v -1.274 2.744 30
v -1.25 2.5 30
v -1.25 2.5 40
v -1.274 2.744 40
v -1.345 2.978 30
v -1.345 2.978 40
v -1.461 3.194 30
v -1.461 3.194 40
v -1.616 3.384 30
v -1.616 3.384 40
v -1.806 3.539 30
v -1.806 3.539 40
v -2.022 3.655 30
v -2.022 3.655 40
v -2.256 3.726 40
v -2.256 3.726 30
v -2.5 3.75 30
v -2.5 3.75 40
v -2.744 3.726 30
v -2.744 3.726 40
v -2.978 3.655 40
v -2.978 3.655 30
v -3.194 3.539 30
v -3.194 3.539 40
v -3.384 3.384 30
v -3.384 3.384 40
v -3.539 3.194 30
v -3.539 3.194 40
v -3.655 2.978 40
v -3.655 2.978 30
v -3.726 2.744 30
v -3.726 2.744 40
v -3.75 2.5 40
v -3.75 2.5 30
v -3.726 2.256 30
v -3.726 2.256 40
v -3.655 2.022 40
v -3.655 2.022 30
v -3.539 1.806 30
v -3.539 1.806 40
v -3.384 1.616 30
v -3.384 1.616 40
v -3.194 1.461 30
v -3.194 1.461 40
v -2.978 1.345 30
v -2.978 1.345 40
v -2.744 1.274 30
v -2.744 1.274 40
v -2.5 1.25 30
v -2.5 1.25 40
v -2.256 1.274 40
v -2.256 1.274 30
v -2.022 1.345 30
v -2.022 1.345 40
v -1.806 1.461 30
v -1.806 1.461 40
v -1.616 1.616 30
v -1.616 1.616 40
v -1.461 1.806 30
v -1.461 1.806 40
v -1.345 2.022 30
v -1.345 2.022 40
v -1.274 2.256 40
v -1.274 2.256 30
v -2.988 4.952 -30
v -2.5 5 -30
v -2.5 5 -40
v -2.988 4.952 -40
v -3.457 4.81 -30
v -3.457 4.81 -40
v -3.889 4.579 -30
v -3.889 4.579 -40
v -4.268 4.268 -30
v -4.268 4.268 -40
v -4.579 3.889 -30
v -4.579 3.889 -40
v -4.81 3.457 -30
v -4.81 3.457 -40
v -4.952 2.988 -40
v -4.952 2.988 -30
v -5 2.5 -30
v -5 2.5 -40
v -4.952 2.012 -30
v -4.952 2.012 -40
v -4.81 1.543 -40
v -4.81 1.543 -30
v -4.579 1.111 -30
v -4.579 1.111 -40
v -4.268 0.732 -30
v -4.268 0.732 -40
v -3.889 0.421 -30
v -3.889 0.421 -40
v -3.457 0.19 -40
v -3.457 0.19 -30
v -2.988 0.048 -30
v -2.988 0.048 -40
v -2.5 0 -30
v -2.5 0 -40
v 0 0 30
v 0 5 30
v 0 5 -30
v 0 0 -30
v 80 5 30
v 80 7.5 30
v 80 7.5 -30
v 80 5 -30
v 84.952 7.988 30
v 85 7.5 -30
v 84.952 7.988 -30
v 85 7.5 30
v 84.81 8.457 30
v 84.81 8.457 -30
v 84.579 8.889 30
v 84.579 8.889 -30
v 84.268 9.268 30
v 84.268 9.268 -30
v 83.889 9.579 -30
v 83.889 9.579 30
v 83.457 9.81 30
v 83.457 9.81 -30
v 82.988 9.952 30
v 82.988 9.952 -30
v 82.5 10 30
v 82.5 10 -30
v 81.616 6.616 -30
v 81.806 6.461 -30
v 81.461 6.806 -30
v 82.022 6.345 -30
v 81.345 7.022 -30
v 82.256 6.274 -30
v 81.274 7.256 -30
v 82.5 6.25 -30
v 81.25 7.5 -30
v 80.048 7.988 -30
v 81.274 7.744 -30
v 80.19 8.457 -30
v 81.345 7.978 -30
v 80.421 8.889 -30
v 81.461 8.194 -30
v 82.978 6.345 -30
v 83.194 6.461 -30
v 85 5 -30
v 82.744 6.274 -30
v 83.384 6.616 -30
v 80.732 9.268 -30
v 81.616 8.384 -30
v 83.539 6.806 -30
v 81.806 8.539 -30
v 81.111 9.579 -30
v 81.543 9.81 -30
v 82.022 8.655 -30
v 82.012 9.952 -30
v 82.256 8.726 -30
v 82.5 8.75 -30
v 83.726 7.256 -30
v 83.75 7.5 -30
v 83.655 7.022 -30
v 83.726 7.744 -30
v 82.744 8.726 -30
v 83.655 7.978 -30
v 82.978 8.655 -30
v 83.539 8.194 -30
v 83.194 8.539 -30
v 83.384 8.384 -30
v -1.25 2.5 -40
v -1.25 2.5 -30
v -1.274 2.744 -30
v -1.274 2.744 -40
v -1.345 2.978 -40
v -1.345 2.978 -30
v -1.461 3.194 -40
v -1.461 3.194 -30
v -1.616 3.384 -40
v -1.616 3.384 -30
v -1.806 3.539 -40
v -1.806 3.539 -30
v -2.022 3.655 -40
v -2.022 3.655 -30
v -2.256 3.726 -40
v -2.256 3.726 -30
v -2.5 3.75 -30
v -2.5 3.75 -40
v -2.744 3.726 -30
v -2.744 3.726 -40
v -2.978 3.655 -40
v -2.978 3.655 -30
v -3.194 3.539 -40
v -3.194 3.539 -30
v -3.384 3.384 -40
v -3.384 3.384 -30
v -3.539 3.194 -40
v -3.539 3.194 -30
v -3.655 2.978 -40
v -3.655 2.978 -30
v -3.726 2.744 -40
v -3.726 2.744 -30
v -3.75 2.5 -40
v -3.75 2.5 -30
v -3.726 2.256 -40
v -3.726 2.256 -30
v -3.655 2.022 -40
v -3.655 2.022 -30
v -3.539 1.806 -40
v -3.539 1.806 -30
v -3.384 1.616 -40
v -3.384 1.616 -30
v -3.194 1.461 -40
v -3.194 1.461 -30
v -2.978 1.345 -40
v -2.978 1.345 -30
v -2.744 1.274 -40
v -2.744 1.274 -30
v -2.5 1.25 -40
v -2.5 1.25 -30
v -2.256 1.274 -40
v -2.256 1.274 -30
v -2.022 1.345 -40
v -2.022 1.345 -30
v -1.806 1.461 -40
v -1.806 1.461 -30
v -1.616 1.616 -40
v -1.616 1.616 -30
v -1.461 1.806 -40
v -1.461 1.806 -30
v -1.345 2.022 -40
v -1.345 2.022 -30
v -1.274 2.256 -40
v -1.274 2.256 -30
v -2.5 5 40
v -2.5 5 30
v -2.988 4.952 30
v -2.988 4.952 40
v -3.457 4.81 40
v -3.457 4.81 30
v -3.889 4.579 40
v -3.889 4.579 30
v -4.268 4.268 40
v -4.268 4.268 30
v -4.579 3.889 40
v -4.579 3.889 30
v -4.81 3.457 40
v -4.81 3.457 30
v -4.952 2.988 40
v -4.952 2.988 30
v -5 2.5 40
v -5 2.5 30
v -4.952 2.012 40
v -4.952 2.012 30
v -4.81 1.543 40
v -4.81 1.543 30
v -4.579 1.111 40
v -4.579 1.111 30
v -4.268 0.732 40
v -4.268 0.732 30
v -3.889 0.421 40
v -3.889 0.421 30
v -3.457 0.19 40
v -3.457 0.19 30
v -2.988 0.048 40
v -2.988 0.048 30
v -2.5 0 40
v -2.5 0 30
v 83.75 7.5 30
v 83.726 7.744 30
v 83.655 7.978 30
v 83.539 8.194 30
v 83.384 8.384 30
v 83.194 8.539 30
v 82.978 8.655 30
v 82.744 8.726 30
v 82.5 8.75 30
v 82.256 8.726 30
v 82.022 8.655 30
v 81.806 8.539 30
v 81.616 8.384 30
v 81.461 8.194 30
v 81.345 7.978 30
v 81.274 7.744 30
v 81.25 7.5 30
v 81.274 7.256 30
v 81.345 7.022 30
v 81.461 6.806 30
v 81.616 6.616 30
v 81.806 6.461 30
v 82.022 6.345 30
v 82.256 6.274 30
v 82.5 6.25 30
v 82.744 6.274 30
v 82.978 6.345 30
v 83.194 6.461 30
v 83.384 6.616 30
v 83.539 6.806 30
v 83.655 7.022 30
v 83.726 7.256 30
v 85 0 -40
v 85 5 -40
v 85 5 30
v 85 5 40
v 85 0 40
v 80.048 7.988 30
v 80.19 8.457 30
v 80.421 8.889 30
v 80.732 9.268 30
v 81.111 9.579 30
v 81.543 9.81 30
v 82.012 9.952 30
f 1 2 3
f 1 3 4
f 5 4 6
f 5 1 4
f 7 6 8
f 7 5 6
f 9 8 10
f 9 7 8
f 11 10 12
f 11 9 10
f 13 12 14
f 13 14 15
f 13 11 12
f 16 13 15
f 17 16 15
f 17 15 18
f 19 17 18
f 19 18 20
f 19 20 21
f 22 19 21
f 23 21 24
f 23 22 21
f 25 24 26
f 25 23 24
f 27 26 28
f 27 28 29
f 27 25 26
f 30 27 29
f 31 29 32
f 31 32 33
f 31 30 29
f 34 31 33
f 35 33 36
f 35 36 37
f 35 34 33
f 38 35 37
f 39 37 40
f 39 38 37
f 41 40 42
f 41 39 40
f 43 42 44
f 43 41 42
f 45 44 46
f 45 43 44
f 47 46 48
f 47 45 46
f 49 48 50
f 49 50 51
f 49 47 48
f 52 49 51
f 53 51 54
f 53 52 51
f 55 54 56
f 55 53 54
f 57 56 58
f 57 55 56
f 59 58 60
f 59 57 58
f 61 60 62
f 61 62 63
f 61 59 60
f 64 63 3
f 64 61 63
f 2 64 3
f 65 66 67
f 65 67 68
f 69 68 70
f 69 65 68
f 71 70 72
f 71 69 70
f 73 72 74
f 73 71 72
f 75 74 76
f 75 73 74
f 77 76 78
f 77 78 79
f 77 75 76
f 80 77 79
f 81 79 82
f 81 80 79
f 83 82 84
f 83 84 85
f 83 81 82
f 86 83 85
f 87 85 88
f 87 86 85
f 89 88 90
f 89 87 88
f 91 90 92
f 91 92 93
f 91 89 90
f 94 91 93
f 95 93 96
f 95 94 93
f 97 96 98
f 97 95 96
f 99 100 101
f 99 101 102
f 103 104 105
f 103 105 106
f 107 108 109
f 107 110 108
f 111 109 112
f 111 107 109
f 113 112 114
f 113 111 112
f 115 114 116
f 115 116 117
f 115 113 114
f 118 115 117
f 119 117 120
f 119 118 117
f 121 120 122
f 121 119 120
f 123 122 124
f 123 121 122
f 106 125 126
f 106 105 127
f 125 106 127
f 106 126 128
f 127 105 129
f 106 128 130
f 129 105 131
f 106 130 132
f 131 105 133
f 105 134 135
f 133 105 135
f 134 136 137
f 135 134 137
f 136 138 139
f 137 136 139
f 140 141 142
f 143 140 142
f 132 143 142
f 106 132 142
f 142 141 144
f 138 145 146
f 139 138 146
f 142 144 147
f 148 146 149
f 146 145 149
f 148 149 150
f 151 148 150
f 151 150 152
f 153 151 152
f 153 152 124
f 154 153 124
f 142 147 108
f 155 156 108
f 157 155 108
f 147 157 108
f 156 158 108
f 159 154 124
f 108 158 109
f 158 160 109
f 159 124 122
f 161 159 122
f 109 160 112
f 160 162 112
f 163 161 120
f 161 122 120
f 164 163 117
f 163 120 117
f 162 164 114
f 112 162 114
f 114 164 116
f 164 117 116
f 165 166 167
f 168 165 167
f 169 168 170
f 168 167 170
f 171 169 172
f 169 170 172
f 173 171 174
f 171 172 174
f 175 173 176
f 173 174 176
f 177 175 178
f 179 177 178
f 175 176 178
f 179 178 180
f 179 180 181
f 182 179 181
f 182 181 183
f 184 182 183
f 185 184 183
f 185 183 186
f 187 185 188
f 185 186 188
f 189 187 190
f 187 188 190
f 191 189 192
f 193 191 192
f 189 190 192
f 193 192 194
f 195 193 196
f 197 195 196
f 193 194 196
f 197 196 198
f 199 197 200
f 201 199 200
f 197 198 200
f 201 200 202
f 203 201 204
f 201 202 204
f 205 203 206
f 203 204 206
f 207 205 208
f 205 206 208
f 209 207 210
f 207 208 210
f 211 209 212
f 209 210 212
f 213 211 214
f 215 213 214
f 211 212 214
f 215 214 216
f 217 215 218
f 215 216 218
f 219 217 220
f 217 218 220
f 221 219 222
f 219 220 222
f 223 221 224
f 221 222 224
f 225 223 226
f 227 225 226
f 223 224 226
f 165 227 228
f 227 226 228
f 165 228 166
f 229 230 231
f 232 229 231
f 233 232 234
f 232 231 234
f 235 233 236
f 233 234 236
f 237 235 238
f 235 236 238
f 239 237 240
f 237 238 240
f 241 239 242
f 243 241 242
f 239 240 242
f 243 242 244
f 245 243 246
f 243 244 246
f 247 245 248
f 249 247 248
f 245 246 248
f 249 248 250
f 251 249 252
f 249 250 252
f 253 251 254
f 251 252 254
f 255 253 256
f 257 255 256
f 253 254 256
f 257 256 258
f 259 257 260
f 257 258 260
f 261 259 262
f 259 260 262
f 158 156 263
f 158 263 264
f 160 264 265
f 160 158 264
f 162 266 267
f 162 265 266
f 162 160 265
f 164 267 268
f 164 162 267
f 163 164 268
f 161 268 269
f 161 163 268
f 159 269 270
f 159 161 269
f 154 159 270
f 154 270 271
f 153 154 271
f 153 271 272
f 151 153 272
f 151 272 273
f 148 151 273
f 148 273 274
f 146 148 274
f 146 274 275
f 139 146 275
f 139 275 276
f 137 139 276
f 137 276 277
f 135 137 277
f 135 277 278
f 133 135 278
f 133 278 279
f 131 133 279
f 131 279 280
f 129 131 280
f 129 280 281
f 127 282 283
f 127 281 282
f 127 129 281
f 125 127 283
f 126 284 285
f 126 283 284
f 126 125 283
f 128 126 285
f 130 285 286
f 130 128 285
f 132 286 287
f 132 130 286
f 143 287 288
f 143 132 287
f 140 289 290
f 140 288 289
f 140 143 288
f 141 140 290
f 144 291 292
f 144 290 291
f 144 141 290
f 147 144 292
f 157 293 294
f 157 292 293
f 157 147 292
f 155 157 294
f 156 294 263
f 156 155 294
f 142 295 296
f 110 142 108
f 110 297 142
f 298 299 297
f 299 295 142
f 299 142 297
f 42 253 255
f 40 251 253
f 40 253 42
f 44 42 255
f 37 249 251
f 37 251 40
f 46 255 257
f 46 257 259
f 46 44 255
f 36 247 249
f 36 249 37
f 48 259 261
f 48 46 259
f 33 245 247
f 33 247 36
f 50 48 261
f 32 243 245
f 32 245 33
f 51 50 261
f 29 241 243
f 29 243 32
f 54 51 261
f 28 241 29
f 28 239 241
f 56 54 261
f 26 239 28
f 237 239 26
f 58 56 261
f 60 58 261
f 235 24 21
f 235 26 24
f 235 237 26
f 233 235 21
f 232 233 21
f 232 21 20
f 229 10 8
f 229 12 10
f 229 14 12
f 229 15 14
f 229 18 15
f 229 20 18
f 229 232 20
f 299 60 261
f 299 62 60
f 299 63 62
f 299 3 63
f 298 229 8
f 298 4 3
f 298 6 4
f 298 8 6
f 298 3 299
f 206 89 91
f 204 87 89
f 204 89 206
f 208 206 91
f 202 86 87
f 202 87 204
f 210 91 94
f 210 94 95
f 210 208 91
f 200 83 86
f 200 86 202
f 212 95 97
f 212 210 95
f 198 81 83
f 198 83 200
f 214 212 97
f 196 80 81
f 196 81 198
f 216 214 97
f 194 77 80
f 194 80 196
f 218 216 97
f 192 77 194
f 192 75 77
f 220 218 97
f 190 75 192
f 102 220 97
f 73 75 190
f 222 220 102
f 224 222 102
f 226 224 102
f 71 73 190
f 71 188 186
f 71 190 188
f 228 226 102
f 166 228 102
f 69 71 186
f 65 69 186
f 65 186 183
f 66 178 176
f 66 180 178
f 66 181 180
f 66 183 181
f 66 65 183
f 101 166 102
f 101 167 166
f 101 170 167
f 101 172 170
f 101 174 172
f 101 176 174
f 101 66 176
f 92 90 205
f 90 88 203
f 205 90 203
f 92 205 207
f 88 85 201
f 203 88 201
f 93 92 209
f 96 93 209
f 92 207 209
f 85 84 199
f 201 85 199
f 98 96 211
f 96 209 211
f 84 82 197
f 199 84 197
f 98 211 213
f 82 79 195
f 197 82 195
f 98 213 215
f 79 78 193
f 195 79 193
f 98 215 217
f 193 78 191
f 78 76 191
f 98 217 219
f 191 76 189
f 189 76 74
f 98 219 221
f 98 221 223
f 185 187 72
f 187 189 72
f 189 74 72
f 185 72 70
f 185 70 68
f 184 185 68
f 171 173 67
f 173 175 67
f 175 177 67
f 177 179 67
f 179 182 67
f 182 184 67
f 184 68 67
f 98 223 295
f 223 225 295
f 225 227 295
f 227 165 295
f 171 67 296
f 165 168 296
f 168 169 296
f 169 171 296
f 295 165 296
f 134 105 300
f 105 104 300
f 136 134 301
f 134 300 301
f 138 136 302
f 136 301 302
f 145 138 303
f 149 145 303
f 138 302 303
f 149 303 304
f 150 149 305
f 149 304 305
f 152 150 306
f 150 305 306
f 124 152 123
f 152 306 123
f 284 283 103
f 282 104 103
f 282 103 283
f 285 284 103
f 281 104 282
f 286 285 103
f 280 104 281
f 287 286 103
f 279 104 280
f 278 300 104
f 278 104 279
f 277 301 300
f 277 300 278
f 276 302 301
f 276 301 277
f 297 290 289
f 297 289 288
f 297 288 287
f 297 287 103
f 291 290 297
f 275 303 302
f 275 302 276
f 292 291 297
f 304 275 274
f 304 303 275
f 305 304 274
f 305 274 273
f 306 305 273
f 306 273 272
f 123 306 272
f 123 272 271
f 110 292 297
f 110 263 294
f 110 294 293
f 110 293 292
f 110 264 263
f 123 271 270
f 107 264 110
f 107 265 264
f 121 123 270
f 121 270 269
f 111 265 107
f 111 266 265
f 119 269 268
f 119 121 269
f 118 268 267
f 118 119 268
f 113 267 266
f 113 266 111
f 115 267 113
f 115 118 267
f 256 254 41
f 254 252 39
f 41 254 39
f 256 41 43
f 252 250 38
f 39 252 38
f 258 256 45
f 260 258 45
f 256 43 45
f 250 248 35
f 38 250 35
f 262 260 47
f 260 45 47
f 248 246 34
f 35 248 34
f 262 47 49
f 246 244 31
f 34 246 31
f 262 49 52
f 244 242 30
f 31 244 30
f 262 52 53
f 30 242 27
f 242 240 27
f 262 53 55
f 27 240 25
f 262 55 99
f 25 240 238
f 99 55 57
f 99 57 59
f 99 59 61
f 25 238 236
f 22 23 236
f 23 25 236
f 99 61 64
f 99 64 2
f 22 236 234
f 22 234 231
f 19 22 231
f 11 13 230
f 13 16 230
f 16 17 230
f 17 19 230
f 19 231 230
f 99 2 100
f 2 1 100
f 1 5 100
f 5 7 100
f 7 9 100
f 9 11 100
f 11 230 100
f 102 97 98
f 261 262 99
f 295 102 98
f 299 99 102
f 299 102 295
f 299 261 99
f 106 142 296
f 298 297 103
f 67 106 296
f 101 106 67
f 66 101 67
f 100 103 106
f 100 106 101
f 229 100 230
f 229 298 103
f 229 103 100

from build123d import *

# Parameters (mm, degrees)
BOSS_EXTRUDE1_DEPTH     = 40
BOSS_EXTRUDE2_START     = 30
SKETCH2_R               = 1.25
BOSS_EXTRUDE2_DEPTH     = 10
CUT_EXTRUDE1_START      = -30
SKETCH3_W               = 5
SKETCH3_H               = 5
CUT_EXTRUDE1_DEPTH      = 10
CUT_EXTRUDE2_DEPTH      = 95.472218138
CUT_EXTRUDE2_DEPTH_BACK = 95.472218138
SKETCH4_R               = 1.25
FILLET1_R               = 2.5


with BuildPart() as part:
    # Sketch1 → Boss-Extrude1 (new, symmetric)
    with BuildSketch(Plane.XY):
        Polygon((0, 0), (85, 0), (85, 10), (80, 10), (80, 5), (0, 5), align=None)
    extrude(amount=BOSS_EXTRUDE1_DEPTH, both=True)

    # Sketch2 → Boss-Extrude2 (add)
    with BuildSketch(Plane.XY.offset(BOSS_EXTRUDE2_START)):
        with BuildLine():
            Line((0, 5), (-2.5, 5))
            ThreePointArc((-2.5, 5), (-5, 2.5), (-2.5, 0))
            Line((-2.5, 0), (0, 0))
            Line((0, 0), (0, 5))
        make_face()
        with Locations((-2.5, 2.5)):
            Circle(SKETCH2_R, mode=Mode.SUBTRACT)
    boss_extrude2 = extrude(amount=BOSS_EXTRUDE2_DEPTH)

    # Mirror2: Boss-Extrude2 across plane
    add(boss_extrude2.mirror(Plane.XY))

    # Sketch3 → Cut-Extrude1 (cut)
    with BuildSketch(Plane.XY.offset(CUT_EXTRUDE1_START)):
        with Locations((82.5, 7.5)):
            Rectangle(SKETCH3_W, SKETCH3_H)
    cut_extrude1 = extrude(amount=-CUT_EXTRUDE1_DEPTH, mode=Mode.SUBTRACT)

    # Mirror3: Cut-Extrude1 across plane
    add(cut_extrude1.mirror(Plane.XY), mode=Mode.SUBTRACT)

    # Sketch4 → Cut-Extrude2 (cut, two sides: drawn at the far end of the back side and taken through both)
    with BuildSketch(Plane.XY.offset(-CUT_EXTRUDE2_DEPTH_BACK)):
        with Locations((82.5, 7.5)):
            Circle(SKETCH4_R)
    extrude(amount=CUT_EXTRUDE2_DEPTH + CUT_EXTRUDE2_DEPTH_BACK, mode=Mode.SUBTRACT)

    # Fillet1
    fillet1_edges = [part.edges().sort_by_distance(p)[0] for p in [
        (80, 10, 0),
        (85, 10, 0),
    ]]
    fillet(fillet1_edges, radius=FILLET1_R - 0.0001)  # a hair under: the kernel refuses the full size


solid = part.part
